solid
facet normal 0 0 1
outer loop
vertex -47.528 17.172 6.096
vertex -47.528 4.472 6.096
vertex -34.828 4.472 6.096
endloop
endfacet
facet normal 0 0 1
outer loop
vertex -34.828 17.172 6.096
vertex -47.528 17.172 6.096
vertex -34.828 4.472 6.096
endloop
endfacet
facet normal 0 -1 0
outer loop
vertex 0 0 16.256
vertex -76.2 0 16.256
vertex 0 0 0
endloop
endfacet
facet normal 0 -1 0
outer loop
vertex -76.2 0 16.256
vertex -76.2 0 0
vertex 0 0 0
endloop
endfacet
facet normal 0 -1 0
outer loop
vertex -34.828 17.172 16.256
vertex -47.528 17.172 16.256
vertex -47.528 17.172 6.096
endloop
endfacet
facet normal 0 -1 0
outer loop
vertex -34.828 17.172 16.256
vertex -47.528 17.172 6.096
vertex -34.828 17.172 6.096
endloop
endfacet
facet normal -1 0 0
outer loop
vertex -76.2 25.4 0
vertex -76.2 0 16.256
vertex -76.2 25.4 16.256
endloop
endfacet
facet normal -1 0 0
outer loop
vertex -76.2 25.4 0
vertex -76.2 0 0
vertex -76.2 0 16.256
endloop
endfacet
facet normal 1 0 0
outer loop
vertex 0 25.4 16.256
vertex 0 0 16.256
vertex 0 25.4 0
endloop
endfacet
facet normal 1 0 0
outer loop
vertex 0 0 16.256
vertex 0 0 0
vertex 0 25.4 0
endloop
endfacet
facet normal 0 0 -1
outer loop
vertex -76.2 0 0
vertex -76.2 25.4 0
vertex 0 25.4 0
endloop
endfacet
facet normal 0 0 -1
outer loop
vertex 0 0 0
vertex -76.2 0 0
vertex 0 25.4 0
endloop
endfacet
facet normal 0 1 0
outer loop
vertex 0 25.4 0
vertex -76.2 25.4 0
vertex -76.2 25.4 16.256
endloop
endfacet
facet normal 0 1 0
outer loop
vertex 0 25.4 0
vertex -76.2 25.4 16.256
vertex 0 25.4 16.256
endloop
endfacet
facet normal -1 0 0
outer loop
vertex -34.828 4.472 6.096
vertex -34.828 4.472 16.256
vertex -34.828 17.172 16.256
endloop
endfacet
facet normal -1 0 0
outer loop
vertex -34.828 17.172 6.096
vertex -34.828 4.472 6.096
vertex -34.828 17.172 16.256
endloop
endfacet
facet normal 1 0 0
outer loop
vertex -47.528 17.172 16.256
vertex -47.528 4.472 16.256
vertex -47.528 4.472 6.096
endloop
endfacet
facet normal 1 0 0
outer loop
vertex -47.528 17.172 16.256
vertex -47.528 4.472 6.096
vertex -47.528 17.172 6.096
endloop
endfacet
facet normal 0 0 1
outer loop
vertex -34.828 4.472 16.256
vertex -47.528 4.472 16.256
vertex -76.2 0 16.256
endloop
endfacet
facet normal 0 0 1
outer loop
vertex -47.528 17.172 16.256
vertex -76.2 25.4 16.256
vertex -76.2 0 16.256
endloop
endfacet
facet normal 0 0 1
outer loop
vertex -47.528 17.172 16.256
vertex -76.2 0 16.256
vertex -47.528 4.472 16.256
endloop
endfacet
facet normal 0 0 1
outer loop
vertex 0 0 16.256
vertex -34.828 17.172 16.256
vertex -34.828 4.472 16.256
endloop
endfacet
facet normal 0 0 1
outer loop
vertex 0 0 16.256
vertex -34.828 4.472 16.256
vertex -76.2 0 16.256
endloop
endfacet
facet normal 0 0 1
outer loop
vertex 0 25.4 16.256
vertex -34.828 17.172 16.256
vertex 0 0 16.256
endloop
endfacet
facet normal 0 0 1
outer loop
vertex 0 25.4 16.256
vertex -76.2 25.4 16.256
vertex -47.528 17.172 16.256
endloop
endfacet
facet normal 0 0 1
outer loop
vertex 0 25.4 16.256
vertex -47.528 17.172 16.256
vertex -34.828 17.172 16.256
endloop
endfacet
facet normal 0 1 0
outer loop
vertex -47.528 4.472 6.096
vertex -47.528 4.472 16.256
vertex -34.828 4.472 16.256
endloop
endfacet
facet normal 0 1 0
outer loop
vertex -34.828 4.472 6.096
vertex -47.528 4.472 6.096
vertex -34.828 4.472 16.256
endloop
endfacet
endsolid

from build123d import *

# Parameters (mm, degrees)
F0_W      = 76.2
F0_H      = 25.4
F1_DEPTH  = 1.016
F1_FACE_W = 76.2
F1_FACE_H = 25.4
F2_DEPTH  = 15.24
F3_W      = 12.7
F3_H      = 12.7
F4_DEPTH  = 10.16


with BuildPart() as f1:
    # F0 (on Top) → F1 (new body)
    with BuildSketch(Plane.XY):
        with Locations((-38.1, 12.7)):
            Rectangle(F0_W, F0_H)
    extrude(amount=F1_DEPTH)

    # F1_face (on face) → F2 (join)
    with BuildSketch(Plane(origin=(-38.1, 12.7, 1.016), x_dir=(1, 0, 0), z_dir=(0, 0, 1))):
        Rectangle(F1_FACE_W, F1_FACE_H)
    extrude(amount=F2_DEPTH)

    # F3 (on face) → F4 (cut)
    with BuildSketch(Plane.XY.offset(16.256)):
        with Locations((-41.178353, 10.822336)):
            Rectangle(F3_W, F3_H)
    extrude(amount=-F4_DEPTH, mode=Mode.SUBTRACT)


solid = f1.part
